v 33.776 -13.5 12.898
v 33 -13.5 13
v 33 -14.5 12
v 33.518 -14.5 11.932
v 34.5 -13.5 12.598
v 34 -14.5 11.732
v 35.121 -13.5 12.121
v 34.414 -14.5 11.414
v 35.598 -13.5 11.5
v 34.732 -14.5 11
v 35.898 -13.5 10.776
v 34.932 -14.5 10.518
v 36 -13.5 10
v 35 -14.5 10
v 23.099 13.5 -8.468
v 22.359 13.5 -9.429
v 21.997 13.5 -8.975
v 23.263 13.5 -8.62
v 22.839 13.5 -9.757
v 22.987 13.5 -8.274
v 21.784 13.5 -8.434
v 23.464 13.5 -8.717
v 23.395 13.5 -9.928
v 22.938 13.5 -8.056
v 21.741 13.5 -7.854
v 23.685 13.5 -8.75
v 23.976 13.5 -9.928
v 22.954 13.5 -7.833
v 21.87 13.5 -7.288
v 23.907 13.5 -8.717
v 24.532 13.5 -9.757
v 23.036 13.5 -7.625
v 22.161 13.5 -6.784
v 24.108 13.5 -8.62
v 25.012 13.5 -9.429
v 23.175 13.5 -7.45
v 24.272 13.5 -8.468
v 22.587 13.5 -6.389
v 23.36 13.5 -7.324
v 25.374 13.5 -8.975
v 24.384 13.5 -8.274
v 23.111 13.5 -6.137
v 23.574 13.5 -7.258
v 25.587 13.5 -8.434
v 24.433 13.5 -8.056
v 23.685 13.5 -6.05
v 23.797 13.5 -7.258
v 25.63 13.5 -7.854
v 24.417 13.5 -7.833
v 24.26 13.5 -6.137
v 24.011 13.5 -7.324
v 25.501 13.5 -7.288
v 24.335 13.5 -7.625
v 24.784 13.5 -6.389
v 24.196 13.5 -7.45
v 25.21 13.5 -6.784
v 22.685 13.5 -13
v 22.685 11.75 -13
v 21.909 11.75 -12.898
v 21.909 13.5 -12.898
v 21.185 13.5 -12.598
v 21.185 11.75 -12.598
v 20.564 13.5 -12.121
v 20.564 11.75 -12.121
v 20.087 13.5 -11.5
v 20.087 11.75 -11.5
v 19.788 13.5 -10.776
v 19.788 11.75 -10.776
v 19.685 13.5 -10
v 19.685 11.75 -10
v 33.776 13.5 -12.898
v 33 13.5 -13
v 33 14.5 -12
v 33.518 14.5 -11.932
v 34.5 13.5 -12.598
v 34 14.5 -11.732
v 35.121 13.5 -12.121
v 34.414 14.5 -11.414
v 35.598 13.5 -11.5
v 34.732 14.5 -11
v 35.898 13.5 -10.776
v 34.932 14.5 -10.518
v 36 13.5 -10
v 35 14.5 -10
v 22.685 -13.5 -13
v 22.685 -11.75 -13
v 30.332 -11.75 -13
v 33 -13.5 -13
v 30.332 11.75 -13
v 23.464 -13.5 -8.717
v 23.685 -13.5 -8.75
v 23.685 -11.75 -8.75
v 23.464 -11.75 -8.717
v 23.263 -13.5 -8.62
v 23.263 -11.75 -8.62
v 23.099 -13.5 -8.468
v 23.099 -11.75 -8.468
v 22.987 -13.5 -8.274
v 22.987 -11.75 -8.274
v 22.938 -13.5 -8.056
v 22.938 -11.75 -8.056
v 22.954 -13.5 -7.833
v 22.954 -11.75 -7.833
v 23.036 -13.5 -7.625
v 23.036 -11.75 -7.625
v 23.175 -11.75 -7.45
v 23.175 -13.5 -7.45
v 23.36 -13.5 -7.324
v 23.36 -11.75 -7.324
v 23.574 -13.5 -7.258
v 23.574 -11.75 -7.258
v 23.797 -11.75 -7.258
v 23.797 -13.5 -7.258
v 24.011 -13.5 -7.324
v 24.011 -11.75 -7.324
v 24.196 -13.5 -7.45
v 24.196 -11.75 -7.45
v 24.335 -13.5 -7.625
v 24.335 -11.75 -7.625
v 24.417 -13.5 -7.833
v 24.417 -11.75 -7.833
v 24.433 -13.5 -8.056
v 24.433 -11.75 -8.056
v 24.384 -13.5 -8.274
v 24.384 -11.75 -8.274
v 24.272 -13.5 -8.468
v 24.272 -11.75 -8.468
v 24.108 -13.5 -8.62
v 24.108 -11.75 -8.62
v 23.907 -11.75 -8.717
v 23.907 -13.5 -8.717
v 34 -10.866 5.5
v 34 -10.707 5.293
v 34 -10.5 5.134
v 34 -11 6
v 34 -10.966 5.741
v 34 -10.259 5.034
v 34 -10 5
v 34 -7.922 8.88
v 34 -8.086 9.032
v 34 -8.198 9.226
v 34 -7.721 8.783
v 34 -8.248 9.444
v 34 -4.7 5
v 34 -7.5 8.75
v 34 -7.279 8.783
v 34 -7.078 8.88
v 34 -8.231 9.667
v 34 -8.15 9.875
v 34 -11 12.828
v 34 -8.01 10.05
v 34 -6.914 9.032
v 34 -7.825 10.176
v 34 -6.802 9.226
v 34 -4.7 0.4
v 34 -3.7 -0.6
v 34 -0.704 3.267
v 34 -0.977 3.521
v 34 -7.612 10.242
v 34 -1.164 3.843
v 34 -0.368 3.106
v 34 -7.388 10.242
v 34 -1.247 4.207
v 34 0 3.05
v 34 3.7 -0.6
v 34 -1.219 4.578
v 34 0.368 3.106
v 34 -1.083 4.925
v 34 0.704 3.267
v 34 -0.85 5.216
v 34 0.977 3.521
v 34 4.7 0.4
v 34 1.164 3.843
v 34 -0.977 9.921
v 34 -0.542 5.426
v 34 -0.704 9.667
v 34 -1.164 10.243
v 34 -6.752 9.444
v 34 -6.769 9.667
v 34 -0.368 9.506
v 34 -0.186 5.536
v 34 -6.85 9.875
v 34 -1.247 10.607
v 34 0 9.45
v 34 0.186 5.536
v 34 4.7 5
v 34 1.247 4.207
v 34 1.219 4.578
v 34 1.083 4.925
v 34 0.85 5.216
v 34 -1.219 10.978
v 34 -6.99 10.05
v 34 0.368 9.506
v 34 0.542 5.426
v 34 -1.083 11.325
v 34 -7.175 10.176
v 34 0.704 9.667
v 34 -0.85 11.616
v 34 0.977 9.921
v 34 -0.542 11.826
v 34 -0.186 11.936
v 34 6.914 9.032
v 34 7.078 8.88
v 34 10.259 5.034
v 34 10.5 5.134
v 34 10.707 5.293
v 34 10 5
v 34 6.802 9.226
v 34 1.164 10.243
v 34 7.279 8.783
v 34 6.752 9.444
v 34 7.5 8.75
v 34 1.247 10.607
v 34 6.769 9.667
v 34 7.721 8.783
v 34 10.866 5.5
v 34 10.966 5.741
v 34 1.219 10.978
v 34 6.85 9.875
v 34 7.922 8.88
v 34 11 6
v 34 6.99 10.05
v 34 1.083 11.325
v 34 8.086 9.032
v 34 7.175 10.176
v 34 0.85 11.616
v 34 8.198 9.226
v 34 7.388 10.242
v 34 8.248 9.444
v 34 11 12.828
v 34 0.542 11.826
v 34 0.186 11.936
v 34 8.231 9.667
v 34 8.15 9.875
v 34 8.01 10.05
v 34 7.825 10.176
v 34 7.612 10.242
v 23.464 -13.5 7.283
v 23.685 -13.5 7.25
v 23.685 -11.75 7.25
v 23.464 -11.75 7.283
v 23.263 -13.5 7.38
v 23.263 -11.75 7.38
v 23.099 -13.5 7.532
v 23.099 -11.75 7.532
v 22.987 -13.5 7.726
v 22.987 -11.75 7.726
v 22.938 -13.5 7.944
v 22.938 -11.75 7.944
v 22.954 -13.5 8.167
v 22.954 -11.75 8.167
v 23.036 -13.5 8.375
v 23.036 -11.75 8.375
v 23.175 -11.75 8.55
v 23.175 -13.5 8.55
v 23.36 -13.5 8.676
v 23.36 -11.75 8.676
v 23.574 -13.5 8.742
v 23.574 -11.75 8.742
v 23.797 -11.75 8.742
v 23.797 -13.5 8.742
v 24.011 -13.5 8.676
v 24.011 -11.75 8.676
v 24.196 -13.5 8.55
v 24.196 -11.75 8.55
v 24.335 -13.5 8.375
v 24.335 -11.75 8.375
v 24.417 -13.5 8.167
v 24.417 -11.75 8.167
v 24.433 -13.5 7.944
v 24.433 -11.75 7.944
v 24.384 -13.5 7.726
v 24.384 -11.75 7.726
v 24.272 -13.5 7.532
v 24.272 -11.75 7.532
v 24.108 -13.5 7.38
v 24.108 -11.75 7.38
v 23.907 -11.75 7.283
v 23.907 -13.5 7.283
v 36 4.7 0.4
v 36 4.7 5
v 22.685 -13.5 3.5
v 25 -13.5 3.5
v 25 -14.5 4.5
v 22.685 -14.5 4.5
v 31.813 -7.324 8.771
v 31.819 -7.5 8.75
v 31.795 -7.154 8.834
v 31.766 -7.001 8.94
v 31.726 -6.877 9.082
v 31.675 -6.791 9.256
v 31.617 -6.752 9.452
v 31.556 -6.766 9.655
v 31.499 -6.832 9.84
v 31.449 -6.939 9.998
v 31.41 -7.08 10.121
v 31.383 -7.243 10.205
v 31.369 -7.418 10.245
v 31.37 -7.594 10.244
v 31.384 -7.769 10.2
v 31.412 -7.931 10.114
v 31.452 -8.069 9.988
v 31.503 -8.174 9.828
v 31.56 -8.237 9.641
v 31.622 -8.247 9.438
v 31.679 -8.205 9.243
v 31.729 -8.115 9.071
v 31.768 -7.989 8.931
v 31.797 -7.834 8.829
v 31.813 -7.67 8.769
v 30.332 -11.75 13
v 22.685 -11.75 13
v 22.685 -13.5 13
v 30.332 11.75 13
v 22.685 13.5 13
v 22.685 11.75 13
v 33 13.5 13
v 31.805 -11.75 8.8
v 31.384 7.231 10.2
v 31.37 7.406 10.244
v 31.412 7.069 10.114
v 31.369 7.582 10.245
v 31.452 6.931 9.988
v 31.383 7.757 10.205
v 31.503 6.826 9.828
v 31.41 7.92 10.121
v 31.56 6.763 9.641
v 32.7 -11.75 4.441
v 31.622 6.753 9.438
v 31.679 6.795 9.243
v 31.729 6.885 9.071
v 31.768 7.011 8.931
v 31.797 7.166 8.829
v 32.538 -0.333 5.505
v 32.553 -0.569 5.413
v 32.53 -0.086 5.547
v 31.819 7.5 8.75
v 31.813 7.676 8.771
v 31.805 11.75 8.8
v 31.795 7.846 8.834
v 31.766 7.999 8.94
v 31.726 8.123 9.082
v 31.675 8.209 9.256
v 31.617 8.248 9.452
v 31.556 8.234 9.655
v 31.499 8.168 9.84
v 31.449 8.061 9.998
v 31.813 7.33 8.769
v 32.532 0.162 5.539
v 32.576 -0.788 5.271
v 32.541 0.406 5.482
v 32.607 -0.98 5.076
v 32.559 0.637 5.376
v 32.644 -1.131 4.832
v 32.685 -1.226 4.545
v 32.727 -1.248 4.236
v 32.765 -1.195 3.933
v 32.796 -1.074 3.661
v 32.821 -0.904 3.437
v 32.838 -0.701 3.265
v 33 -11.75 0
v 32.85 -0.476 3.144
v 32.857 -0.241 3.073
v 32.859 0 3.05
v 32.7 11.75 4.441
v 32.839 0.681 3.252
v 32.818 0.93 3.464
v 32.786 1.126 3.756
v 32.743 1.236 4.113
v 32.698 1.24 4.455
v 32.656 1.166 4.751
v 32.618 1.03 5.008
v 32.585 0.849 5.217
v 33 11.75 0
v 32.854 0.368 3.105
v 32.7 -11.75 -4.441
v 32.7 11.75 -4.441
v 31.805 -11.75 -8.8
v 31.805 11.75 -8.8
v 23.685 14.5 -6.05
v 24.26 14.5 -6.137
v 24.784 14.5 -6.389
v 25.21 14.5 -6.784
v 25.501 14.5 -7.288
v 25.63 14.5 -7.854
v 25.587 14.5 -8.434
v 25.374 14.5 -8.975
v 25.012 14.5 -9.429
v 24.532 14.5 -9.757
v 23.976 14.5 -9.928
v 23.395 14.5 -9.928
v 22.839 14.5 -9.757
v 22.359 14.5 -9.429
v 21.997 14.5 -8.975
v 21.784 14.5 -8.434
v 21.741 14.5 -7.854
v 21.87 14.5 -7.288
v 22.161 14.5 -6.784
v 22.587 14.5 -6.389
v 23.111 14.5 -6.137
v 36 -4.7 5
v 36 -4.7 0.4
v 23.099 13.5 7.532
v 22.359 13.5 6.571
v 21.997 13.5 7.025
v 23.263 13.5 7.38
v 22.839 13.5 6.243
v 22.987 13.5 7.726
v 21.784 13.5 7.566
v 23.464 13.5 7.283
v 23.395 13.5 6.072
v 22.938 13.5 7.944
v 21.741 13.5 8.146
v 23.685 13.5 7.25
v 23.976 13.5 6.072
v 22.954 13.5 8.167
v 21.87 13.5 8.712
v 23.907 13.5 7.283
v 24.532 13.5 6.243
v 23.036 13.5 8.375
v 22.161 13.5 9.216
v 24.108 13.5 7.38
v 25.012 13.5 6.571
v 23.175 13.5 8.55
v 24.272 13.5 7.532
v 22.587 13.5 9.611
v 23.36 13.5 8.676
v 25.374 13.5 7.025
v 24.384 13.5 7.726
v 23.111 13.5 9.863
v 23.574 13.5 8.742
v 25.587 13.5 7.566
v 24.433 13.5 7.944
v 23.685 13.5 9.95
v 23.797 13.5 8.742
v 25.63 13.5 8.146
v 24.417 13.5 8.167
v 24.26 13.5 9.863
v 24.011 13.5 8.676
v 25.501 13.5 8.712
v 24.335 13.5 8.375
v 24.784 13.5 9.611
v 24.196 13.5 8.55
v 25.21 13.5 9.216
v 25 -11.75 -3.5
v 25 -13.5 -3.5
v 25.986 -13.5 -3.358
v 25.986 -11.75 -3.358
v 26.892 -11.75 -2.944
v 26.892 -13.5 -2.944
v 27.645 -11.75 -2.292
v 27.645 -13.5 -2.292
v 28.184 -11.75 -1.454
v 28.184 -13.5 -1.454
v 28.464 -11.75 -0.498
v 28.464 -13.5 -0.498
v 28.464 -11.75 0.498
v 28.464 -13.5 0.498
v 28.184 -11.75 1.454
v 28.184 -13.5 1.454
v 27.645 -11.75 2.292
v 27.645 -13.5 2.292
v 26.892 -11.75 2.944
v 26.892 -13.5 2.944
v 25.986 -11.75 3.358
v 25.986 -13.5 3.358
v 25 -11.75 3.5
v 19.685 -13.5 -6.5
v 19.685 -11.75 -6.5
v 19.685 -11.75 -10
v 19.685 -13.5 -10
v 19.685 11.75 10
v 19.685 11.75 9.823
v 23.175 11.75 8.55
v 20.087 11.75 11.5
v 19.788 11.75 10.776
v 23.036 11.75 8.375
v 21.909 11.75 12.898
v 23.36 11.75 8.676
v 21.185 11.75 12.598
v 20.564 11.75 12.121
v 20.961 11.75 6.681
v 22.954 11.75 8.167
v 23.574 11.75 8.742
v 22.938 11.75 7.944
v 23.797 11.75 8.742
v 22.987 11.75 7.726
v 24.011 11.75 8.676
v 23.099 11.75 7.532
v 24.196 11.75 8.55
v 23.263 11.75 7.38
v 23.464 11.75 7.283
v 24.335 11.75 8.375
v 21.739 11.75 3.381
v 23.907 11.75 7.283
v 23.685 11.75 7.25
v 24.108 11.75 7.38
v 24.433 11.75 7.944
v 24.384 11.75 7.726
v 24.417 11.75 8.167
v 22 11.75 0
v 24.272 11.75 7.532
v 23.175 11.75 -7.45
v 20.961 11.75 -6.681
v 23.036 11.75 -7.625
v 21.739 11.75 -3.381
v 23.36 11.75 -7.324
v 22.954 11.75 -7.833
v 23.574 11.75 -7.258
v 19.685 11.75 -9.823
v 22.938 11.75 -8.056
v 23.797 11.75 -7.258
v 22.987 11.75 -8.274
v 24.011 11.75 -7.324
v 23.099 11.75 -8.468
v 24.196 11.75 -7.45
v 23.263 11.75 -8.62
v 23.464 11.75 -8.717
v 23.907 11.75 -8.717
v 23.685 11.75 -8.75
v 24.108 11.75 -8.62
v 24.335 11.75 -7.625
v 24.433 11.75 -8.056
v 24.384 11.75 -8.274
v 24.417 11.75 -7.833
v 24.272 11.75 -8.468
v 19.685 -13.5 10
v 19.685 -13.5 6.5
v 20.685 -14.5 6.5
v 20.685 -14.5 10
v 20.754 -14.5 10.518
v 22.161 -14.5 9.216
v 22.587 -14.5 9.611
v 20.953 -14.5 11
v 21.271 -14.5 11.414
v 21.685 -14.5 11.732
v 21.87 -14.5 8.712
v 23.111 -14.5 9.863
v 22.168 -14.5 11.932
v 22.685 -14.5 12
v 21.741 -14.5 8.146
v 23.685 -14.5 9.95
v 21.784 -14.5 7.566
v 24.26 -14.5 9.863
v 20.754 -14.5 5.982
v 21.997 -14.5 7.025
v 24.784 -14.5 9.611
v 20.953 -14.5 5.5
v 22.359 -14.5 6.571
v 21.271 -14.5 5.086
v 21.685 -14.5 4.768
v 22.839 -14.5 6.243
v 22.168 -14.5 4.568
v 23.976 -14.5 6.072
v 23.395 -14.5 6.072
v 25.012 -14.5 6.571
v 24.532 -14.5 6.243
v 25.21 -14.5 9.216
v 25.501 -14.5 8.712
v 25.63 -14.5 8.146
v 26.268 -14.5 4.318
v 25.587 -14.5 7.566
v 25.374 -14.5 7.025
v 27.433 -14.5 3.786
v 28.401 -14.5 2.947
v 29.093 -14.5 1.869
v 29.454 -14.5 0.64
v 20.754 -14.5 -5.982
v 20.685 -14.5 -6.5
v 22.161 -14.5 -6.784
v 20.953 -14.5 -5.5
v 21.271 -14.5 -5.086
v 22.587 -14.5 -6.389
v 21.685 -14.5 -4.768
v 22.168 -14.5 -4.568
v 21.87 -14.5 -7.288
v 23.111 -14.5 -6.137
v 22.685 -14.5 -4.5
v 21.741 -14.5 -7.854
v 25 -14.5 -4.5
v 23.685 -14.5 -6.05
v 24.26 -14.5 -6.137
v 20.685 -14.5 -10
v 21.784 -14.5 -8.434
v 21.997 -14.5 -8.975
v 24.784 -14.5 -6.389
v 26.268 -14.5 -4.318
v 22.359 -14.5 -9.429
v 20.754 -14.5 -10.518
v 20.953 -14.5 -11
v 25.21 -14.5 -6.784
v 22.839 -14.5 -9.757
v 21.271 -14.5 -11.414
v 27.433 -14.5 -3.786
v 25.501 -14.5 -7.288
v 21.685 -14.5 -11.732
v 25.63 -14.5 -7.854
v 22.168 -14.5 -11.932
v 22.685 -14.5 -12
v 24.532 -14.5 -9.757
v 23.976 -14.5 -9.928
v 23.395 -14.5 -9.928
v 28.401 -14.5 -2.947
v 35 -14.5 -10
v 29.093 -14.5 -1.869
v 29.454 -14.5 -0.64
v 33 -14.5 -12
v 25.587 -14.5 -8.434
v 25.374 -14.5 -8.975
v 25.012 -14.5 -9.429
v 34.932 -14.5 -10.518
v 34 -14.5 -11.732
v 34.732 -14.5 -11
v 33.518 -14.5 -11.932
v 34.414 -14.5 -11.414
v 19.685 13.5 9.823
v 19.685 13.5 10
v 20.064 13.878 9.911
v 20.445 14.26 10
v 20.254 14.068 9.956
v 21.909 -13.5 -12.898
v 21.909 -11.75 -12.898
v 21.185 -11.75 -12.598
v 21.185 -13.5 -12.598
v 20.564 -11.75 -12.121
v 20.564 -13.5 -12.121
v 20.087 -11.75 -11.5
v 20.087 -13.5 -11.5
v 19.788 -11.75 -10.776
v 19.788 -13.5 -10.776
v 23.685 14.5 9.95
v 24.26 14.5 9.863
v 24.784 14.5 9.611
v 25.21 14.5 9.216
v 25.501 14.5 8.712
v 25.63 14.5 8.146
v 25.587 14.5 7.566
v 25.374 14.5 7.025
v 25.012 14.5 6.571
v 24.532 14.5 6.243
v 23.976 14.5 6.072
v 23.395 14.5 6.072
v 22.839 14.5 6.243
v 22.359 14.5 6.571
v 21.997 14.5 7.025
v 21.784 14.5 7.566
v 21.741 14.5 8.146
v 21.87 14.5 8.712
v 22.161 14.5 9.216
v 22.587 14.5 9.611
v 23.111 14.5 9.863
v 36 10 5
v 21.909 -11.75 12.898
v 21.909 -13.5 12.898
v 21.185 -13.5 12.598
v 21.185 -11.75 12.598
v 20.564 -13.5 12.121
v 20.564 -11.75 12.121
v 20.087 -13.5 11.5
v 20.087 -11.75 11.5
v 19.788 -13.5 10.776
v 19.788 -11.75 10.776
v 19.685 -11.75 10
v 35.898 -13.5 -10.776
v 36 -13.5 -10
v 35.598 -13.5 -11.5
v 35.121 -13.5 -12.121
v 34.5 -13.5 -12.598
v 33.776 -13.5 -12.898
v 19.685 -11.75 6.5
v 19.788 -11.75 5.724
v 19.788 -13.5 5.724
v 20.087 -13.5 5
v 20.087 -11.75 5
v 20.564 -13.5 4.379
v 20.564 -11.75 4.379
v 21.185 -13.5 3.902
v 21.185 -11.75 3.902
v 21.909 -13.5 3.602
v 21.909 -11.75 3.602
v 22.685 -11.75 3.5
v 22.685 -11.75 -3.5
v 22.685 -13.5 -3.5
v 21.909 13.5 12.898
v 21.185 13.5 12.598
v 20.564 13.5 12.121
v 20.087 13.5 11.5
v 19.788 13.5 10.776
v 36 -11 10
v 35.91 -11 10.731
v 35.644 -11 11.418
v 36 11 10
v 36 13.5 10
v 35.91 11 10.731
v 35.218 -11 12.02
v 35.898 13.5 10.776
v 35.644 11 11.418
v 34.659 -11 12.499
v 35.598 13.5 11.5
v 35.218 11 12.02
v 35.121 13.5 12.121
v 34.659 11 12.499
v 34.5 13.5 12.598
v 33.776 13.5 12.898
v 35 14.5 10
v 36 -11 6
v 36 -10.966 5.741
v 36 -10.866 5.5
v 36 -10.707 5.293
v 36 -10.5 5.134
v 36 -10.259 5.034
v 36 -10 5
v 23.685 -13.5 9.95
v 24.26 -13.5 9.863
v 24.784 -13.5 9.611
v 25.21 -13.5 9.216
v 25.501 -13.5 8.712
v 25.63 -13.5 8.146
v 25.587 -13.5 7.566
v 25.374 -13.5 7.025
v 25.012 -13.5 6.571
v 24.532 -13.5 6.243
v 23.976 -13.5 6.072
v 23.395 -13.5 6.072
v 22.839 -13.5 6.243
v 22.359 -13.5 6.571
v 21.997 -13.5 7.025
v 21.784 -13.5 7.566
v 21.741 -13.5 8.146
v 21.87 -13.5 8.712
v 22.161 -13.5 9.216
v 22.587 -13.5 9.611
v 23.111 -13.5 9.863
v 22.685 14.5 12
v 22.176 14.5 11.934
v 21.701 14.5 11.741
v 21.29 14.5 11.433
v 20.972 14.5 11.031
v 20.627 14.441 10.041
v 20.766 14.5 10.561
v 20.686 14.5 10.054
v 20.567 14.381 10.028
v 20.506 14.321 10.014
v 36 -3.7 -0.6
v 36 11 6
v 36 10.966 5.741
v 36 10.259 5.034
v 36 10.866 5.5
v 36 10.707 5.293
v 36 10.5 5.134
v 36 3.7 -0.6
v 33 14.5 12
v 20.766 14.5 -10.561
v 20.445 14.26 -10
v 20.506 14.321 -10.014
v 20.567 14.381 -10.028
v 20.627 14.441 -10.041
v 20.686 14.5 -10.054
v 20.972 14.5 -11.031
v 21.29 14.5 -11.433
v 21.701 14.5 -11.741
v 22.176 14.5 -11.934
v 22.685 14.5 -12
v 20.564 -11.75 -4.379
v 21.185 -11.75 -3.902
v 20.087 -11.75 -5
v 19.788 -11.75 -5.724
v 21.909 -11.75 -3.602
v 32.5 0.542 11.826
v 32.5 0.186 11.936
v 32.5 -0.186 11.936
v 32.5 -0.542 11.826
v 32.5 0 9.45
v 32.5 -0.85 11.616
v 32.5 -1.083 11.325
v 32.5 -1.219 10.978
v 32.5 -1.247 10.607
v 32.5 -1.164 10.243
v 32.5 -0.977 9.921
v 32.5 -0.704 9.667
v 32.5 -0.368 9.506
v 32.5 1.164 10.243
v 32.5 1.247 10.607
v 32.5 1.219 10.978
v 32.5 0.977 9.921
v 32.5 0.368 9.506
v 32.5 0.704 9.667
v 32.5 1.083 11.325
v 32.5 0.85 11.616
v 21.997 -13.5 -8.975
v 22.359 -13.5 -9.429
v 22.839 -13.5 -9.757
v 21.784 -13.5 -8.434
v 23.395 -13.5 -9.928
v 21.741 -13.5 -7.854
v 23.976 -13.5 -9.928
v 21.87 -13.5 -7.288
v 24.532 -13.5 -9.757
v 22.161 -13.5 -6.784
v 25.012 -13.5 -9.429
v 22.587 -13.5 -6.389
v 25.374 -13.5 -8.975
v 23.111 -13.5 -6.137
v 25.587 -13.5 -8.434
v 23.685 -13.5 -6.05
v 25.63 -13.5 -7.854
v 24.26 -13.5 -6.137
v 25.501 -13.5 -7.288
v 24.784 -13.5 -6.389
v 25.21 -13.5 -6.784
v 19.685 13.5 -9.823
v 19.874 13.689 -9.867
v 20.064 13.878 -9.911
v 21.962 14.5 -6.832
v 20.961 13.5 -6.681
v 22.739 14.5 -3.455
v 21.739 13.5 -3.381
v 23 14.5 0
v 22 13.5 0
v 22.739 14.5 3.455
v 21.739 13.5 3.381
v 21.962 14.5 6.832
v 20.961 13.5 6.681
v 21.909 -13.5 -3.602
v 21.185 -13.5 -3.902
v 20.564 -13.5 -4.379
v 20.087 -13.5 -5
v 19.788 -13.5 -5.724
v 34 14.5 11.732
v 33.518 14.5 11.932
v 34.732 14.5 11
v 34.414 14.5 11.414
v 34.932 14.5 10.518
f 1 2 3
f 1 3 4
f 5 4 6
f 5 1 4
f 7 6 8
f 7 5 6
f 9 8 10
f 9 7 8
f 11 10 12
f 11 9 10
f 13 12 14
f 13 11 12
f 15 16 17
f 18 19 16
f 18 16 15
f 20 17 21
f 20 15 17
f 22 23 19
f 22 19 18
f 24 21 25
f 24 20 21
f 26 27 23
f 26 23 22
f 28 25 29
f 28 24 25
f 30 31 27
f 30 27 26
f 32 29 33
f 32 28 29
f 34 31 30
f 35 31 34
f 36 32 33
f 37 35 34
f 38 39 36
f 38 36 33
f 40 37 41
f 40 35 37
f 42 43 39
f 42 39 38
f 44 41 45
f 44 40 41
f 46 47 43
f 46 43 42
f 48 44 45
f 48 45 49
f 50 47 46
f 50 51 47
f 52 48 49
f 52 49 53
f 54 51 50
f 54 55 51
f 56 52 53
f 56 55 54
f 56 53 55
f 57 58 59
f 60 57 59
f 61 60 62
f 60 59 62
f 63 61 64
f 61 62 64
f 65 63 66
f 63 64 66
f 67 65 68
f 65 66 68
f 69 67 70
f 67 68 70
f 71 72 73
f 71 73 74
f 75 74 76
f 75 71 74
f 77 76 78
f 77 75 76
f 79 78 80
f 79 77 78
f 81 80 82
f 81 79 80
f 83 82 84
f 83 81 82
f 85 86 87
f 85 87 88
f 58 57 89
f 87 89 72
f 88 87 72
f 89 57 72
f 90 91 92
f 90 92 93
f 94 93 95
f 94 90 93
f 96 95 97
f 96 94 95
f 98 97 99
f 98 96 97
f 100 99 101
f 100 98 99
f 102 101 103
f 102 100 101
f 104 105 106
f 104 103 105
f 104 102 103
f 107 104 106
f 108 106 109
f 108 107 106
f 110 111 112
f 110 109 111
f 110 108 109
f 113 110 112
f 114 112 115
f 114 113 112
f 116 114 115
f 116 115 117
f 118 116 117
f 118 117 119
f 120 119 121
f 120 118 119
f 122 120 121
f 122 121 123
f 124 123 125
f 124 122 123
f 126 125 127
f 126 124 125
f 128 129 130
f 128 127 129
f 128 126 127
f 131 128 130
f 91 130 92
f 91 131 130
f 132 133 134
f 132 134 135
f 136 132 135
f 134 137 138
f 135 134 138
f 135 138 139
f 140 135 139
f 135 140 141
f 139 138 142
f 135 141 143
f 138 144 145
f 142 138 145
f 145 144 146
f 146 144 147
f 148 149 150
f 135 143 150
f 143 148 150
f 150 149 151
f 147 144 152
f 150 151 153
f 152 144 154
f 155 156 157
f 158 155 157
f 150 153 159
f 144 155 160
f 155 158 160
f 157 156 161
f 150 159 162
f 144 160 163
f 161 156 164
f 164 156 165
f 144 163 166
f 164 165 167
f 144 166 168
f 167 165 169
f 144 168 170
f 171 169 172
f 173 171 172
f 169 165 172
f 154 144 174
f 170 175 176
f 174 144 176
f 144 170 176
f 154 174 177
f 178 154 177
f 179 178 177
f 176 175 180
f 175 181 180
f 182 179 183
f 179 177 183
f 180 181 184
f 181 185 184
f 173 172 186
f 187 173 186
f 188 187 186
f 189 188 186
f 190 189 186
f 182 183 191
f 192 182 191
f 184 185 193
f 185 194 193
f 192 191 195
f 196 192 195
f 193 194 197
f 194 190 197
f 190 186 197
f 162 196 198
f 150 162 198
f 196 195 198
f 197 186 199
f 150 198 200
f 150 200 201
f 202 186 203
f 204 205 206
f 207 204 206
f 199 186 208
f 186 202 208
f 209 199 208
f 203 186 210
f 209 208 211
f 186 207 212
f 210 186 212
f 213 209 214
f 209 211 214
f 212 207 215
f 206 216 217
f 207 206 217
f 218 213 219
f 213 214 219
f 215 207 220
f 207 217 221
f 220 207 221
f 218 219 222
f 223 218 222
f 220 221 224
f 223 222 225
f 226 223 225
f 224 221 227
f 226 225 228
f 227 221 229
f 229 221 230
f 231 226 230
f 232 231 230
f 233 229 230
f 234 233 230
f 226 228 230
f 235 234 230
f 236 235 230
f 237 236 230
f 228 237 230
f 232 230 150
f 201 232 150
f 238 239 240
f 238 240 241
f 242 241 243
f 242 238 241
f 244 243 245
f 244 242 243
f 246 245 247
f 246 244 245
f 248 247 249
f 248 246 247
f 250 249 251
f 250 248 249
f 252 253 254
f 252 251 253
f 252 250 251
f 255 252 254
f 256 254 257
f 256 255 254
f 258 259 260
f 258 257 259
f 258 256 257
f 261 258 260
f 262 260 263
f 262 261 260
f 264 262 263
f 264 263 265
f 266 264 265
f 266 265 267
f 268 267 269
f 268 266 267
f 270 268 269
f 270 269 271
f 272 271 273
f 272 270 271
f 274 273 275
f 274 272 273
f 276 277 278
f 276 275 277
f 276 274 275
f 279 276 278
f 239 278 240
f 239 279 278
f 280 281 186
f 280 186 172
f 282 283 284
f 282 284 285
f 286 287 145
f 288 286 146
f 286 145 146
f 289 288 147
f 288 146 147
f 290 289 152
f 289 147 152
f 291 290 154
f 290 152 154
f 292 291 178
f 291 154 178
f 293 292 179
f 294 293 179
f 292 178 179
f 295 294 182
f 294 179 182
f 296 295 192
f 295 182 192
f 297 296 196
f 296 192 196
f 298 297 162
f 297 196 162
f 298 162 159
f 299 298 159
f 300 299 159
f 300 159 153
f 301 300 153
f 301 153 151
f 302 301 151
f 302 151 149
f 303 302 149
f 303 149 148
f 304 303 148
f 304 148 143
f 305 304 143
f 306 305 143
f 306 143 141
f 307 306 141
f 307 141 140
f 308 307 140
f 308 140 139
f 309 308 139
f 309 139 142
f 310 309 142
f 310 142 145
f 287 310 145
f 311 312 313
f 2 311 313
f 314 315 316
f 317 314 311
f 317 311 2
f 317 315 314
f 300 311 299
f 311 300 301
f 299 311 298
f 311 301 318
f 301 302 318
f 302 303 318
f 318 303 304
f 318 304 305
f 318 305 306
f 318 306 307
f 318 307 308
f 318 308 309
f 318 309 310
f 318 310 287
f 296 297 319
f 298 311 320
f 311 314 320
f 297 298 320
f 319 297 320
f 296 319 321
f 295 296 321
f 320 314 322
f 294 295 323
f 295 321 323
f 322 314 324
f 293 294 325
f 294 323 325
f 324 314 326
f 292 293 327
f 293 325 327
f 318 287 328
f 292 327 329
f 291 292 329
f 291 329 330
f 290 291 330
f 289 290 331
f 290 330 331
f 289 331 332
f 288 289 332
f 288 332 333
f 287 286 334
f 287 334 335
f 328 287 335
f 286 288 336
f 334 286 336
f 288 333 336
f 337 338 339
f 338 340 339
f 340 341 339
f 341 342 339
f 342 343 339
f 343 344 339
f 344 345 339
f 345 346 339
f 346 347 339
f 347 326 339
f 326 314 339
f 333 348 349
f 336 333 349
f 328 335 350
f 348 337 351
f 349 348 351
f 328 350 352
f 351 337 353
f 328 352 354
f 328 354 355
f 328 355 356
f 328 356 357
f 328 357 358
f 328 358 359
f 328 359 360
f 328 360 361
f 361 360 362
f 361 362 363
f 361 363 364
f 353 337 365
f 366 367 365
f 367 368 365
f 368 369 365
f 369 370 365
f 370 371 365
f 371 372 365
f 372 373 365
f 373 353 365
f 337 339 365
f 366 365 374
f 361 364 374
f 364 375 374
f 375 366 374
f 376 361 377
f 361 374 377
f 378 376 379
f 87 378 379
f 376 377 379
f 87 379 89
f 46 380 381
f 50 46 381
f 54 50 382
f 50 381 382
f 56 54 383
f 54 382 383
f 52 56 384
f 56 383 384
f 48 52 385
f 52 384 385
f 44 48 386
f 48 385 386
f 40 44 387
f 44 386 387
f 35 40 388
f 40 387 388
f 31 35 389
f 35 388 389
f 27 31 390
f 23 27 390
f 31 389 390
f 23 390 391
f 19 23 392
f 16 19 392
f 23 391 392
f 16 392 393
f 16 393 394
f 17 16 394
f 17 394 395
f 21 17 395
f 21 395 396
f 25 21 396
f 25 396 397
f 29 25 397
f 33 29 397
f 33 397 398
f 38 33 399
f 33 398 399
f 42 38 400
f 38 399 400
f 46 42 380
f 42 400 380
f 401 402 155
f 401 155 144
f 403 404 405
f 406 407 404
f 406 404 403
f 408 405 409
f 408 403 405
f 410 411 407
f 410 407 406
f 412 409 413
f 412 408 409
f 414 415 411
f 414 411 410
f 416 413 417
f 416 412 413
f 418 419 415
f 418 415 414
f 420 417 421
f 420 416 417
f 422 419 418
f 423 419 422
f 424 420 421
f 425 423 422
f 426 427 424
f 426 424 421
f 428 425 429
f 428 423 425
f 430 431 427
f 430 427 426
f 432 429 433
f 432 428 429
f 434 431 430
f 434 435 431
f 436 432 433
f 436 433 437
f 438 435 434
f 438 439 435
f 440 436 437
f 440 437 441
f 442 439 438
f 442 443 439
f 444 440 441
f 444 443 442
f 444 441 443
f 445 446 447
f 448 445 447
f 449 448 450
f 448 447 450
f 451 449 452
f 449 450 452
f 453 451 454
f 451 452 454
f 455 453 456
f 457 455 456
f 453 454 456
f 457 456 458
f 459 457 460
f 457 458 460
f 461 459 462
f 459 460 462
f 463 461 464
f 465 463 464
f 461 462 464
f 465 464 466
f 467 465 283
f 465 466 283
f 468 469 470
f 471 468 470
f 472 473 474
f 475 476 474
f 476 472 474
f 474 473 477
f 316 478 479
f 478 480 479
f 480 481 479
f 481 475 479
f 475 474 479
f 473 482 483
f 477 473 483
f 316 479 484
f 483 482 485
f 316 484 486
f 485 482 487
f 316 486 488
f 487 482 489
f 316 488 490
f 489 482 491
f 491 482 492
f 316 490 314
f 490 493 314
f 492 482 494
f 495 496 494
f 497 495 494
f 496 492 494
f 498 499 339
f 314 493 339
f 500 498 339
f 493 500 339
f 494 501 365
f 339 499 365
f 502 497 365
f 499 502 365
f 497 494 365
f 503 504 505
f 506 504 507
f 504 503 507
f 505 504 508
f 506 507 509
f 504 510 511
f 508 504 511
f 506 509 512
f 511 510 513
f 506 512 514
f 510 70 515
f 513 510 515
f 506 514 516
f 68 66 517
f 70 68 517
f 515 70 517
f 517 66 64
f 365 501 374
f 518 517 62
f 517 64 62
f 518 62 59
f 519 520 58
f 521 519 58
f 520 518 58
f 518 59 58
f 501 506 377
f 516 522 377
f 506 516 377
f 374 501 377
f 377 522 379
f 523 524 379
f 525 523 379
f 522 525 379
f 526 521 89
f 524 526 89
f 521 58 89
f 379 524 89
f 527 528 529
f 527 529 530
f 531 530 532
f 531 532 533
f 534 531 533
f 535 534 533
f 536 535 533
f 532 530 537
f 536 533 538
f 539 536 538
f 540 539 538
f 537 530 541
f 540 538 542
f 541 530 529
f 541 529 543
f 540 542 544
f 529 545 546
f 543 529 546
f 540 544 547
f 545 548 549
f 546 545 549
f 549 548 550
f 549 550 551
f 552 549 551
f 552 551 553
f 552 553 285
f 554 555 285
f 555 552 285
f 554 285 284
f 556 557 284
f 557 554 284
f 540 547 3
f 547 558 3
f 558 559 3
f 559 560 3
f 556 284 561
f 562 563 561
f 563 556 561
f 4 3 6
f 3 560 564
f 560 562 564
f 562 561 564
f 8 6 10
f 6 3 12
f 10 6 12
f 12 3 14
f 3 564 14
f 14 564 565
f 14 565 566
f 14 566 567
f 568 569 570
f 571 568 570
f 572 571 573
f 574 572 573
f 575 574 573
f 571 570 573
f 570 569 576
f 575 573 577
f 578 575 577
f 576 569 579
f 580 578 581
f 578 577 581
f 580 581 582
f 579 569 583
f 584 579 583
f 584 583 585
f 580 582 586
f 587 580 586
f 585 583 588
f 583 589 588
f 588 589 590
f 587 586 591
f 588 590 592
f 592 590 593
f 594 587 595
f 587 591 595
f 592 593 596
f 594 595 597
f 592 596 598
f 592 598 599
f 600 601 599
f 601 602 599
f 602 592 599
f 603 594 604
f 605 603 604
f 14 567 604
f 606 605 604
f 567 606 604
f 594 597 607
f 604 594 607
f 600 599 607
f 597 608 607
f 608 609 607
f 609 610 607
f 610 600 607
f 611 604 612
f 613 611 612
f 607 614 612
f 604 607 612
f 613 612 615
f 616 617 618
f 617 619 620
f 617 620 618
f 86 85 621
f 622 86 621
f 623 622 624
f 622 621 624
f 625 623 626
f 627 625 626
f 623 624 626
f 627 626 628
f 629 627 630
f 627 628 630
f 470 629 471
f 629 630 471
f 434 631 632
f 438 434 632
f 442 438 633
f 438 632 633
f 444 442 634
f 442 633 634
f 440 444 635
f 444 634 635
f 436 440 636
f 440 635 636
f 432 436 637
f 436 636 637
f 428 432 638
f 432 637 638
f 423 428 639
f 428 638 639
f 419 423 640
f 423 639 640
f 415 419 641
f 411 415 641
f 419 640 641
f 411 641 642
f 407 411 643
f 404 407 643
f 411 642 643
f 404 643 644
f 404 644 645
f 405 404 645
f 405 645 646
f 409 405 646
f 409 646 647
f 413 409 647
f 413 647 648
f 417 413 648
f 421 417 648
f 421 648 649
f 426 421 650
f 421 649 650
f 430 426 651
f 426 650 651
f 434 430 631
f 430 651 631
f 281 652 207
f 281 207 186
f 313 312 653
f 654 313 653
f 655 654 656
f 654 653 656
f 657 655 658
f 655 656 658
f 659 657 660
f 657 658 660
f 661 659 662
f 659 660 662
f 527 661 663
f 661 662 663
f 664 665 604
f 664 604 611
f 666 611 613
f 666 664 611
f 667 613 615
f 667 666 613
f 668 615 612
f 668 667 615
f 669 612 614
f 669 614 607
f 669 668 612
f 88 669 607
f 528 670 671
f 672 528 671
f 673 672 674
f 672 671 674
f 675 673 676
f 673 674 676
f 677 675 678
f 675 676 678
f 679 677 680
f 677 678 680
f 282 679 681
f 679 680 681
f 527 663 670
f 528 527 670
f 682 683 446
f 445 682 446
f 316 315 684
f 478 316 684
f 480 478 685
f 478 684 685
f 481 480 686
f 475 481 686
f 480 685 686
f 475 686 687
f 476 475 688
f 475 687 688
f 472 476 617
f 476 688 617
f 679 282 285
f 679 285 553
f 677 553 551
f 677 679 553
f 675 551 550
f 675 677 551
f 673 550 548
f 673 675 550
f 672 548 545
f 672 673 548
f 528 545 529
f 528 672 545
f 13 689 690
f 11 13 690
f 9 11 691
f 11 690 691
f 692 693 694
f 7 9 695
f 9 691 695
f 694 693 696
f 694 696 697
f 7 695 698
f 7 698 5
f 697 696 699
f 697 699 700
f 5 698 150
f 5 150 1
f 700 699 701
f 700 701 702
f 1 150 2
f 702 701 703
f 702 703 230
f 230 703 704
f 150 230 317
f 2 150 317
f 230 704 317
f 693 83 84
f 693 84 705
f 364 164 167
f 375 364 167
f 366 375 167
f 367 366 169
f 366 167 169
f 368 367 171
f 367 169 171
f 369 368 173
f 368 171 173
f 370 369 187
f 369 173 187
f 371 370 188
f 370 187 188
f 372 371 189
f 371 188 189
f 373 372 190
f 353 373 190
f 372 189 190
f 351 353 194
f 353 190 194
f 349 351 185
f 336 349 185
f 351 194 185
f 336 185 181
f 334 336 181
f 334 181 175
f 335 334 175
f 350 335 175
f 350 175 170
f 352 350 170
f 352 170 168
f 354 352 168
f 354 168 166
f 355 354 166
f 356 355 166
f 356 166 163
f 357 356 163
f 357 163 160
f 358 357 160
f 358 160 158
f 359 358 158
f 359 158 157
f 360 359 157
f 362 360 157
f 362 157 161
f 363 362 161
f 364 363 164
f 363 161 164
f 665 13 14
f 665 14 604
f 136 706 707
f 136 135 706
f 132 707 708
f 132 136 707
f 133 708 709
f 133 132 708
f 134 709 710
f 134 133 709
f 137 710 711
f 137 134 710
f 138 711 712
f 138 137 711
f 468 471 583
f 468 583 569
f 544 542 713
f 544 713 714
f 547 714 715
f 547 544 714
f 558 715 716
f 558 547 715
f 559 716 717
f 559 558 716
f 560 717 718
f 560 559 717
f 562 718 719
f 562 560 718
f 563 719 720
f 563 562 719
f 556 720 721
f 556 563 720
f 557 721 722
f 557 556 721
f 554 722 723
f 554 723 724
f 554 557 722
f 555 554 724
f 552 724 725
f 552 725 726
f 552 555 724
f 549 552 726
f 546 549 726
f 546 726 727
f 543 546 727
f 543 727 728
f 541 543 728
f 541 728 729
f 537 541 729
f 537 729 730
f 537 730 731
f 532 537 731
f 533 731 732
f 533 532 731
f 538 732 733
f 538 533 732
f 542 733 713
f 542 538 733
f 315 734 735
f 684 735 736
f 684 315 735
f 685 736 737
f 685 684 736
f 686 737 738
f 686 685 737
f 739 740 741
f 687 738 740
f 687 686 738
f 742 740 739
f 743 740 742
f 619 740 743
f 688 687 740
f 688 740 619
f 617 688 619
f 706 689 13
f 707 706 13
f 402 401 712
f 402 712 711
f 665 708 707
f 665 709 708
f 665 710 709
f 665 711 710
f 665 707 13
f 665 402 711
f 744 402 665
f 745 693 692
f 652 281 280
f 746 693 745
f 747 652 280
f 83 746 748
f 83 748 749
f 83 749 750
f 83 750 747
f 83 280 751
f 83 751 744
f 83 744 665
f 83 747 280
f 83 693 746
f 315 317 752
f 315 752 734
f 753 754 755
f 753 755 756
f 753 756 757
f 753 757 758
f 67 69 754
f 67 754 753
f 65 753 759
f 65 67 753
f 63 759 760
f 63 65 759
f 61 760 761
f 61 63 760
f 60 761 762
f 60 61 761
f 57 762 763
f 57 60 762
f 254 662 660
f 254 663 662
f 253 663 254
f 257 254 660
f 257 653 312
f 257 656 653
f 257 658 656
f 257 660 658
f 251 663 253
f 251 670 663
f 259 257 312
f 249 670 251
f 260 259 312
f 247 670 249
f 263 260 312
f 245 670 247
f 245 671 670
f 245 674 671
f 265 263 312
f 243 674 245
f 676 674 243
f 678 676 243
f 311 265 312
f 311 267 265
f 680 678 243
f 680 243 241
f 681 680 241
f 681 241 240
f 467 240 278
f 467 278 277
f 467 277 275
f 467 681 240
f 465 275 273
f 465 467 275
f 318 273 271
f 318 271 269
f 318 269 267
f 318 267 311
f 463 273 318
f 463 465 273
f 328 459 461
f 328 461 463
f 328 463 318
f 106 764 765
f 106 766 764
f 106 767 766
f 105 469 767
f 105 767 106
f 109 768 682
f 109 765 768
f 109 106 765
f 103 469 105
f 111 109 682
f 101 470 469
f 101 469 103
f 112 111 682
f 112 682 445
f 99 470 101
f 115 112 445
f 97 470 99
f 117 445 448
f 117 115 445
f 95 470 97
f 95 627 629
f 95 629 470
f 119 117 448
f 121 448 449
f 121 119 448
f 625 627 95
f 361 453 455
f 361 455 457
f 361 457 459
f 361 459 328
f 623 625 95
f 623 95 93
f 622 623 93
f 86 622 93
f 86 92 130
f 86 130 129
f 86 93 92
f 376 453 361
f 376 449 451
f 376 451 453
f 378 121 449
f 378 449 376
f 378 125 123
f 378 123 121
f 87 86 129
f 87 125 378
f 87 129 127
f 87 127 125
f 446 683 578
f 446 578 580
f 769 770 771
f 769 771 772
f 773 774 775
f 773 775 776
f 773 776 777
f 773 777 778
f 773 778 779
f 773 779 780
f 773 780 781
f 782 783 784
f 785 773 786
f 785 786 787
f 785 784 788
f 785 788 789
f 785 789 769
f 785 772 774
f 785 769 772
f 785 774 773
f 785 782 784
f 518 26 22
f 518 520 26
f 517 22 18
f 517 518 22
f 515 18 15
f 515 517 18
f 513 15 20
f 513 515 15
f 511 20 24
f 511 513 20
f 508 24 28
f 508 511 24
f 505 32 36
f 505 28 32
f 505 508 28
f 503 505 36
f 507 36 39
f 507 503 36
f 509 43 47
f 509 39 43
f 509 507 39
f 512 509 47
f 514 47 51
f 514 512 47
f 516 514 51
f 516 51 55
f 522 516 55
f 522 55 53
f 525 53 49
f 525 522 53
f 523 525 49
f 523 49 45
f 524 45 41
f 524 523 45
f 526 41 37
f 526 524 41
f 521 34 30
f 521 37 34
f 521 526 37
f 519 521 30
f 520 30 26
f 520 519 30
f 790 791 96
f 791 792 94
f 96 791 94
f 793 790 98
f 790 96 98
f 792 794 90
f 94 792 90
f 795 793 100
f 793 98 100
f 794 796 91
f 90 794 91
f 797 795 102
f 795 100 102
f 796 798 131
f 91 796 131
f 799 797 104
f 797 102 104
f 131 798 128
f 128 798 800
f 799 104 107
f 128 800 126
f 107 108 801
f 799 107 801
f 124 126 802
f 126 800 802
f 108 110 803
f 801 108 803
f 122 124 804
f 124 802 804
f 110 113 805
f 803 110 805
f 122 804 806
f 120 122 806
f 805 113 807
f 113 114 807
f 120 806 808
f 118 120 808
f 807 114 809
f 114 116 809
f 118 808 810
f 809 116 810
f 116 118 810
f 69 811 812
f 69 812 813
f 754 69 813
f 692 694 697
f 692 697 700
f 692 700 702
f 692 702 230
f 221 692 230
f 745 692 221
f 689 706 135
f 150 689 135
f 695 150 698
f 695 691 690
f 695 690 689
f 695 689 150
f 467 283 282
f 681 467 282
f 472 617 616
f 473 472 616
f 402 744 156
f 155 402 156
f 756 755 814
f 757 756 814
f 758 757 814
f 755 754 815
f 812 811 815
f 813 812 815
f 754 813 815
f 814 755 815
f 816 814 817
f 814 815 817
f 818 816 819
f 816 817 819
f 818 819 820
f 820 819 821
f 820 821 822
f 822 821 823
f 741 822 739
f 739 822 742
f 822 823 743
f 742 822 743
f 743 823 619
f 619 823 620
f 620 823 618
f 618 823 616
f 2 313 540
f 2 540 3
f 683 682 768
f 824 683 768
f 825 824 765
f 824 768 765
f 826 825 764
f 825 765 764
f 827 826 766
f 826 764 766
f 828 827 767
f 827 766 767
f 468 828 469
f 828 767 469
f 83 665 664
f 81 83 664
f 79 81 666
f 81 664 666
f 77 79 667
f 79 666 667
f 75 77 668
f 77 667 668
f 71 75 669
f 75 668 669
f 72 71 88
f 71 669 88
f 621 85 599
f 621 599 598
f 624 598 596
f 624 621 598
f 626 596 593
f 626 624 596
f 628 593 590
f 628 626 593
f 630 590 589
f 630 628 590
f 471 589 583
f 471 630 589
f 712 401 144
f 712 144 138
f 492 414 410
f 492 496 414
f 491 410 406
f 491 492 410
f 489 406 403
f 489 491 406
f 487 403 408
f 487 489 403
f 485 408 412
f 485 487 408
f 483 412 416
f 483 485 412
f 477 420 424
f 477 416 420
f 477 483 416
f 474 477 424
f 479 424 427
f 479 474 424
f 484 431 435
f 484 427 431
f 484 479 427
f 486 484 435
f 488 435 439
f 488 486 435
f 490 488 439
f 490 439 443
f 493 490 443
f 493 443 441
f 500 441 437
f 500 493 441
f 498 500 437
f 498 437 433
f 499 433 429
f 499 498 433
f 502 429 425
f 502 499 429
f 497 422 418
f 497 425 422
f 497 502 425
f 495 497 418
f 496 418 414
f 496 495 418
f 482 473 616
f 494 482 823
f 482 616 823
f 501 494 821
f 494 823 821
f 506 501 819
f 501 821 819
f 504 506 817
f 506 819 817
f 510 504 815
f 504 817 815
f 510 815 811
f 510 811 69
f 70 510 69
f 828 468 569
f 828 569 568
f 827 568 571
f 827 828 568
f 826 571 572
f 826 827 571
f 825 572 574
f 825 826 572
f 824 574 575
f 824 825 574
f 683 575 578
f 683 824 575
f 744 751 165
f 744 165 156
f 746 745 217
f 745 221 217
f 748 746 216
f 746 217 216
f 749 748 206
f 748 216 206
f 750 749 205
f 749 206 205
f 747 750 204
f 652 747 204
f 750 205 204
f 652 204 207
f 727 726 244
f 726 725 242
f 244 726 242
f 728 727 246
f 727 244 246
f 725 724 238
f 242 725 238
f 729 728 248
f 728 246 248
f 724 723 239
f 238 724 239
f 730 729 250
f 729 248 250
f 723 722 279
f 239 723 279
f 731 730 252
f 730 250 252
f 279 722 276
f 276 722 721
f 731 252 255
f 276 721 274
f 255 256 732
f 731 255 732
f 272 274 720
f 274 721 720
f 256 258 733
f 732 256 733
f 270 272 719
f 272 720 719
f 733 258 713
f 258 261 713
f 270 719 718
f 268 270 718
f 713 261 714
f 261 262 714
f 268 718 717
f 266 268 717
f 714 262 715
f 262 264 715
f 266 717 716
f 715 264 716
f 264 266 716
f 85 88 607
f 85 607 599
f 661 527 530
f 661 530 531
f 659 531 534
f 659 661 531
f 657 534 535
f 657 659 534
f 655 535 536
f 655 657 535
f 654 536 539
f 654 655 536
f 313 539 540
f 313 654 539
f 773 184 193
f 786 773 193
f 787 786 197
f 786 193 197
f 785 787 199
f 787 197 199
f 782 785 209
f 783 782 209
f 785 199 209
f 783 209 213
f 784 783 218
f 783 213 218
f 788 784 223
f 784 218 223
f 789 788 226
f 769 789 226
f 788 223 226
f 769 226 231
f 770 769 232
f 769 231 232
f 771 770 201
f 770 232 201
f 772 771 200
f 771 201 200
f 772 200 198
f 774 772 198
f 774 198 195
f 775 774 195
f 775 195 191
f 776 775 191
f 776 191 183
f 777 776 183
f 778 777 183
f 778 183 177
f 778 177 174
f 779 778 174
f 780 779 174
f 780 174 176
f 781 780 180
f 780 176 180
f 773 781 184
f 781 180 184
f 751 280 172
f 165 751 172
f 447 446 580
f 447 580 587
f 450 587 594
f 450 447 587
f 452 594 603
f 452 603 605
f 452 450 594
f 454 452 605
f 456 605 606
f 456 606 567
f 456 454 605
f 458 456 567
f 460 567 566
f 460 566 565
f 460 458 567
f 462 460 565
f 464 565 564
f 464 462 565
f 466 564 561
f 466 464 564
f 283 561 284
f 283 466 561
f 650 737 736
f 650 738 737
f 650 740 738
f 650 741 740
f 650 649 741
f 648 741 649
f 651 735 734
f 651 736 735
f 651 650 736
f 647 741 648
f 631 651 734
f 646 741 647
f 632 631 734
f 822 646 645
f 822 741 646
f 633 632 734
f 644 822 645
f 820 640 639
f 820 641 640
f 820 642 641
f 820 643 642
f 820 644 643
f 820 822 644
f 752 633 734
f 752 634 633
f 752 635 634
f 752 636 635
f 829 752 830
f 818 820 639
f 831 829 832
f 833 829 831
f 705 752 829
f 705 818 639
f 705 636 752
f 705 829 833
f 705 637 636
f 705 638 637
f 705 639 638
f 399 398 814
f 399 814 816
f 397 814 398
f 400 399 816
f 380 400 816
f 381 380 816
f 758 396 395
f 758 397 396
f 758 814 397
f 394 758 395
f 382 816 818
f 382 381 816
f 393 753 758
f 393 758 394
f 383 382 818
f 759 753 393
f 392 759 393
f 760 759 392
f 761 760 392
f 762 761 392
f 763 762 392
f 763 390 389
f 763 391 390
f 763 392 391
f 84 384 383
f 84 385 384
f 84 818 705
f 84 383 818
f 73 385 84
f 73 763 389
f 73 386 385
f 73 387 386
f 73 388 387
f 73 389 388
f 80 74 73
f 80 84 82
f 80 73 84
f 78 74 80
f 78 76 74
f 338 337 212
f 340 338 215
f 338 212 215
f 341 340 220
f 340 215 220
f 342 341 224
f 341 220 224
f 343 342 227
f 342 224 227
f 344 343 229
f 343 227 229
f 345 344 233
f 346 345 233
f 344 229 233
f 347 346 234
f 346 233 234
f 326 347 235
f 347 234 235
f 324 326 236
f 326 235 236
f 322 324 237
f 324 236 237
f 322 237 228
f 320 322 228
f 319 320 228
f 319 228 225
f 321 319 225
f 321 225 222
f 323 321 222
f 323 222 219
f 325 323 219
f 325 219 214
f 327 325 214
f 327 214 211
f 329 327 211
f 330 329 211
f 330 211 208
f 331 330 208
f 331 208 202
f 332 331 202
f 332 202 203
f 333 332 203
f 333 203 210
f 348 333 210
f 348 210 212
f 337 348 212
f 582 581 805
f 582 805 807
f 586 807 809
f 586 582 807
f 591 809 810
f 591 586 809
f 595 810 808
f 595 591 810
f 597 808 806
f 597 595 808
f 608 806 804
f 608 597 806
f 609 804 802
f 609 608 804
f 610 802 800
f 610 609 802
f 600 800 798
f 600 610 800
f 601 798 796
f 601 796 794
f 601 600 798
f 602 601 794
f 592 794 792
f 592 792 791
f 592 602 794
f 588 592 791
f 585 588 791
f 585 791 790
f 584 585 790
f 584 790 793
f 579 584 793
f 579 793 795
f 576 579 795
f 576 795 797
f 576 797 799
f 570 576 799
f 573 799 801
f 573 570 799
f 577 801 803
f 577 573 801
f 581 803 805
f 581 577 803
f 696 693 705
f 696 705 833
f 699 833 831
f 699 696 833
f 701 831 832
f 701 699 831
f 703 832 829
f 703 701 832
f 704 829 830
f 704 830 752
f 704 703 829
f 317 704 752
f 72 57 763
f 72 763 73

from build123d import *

# Parameters (mm, degrees)
SKETCH_1_W          = 16.31456143534598
SKETCH_1_H          = 26.000000000000004
SKETCH_1_R          = 0.7500000000000021
EXTRUDE_1_DEPTH     = 14.5
SKETCH_2_R          = 33
CUT_EXTRUDE_1_DEPTH = 11.75
CUT_EXTRUDE_2_DEPTH = 2
CUT_EXTRUDE_7_REACH = 50.021
SKETCH_8_R          = 22
FILLET_1_R          = 1
CHAMFER_1_SIZE      = 1
SKETCH_4_R          = 1.2500000000000002
SKETCH_4_R_2        = 1.2499999999999991
CUT_EXTRUDE_3_DEPTH = 1.5
SKETCH_5_R          = 0.7500000000000004
CUT_EXTRUDE_4_DEPTH = 25.169333290066117
CUT_EXTRUDE_5_REACH = 50.021
FILLET_2_R          = 3
CHAMFER_3_SIZE      = 1
SKETCH_7_R          = 1.949999999999999
CUT_EXTRUDE_6_DEPTH = 1
CHAMFER_4_SIZE      = 1


with BuildPart() as part:
    # Эскиз1 → Бобышка-Вытянуть1 (new, symmetric)
    with BuildSketch(Plane(origin=(0, 0, 0), x_dir=(1, 0, 0), z_dir=(0, 1, 0))):
        with Locations((27.84271928232701, 0)):
            Rectangle(SKETCH_1_W, SKETCH_1_H)
        with Locations(Location((23.68543856465402, -8, 0), (0, 0, 90))):
            Circle(SKETCH_1_R, mode=Mode.SUBTRACT)
        with Locations(Location((23.68543856465402, 8, 0), (0, 0, 90))):
            Circle(SKETCH_1_R, mode=Mode.SUBTRACT)
    extrude(amount=EXTRUDE_1_DEPTH, both=True)

    # Эскиз2 → Вырез-Вытянуть1 (cut, symmetric)
    with BuildSketch(Plane(origin=(0, 0, 0), x_dir=(1, 0, 0), z_dir=(0, 1, 0))):
        Circle(SKETCH_2_R)
    extrude(amount=CUT_EXTRUDE_1_DEPTH, both=True, mode=Mode.SUBTRACT)

    # Эскиз3 → Вырез-Вытянуть2 (cut)
    with BuildSketch(Plane(origin=(36, 0, 0), x_dir=(0, 0, -1), z_dir=(1, 0, 0))):
        Polygon((-13.000000000000004, 10.999999999999998), (-5.000000000000003, 10.999999999999996), (-5.000000000000002, 4.699999999999998), (0.5999999999999969, 4.699999999999999), (0.5999999999999981, -4.699999999999999), (-5.000000000000001, -4.7), (-5, -10.999999999999996), (-13, -11.000000000000002), align=None)
    extrude(amount=-CUT_EXTRUDE_2_DEPTH, mode=Mode.SUBTRACT)

    # Эскиз8 → Вырез-Вытянуть7 (cut, up to next)
    with BuildSketch(Plane(origin=(0, 14.5, 0), x_dir=(1, 0, 0), z_dir=(0, 1, 0)), mode=Mode.PRIVATE) as cut_extrude_7_sk1:
        Circle(SKETCH_8_R)
    cut_extrude_7_tool1 = extrude(cut_extrude_7_sk1.sketch, amount=-CUT_EXTRUDE_7_REACH, mode=Mode.PRIVATE) & part.part
    add(cut_extrude_7_tool1.solids().sort_by_distance((0, 14.5, 0))[0], mode=Mode.SUBTRACT)

    # Скругление1
    fillet_1_edges = [part.edges().sort_by_distance(p)[0] for p in [
        (35, 10.999999999999996, 5.000000000000003),
        (35, -10.999999999999996, 5),
    ]]
    fillet(fillet_1_edges, radius=FILLET_1_R)

    # Фаска1
    chamfer_1_edges = [part.edges().sort_by_distance(p)[0] for p in [
        (35, 4.699999999999999, -0.5999999999999969),
        (35, -4.699999999999999, -0.5999999999999981),
    ]]
    chamfer(chamfer_1_edges, length=CHAMFER_1_SIZE)

    # Эскиз4 → Вырез-Вытянуть3 (cut)
    with BuildSketch(Plane(origin=(33.99999999999999, 0, 0), x_dir=(0, 0, -1), z_dir=(1, 0, 0))):
        with Locations((-4.300000000000002, 0)):
            Circle(SKETCH_4_R)
        with Locations((-10.700000000000001, 0)):
            Circle(SKETCH_4_R_2)
    extrude(amount=-CUT_EXTRUDE_3_DEPTH, mode=Mode.SUBTRACT)

    # Эскиз5 → Вырез-Вытянуть4 (cut, through all)
    with BuildSketch(Plane(origin=(33.99999999999999, 0, 0), x_dir=(0, 0, -1), z_dir=(1, 0, 0))):
        with Locations((-9.500000000000002, 7.5)):
            Circle(SKETCH_5_R)
        with Locations((-9.500000000000002, -7.5)):
            Circle(SKETCH_5_R)
    extrude(amount=-CUT_EXTRUDE_4_DEPTH, mode=Mode.SUBTRACT)

    # Эскиз6 → Вырез-Вытянуть5 (cut, up to next)
    with BuildSketch(Plane.XZ.offset(14.5), mode=Mode.PRIVATE) as cut_extrude_5_sk1:
        with BuildLine():
            ThreePointArc((25, -3.5), (21.5, 4.3e-16), (25, 3.5))
            Line((25, 3.5), (19.68543856465402, 3.499999999999999))
            Line((19.68543856465402, 3.499999999999999), (19.68543856465402, -3.500000000000001))
            Line((19.68543856465402, -3.500000000000001), (25, -3.5))
        make_face()
    cut_extrude_5_tool1 = extrude(cut_extrude_5_sk1.sketch, amount=-CUT_EXTRUDE_5_REACH, mode=Mode.PRIVATE) & part.part
    # Эскиз6 → Вырез-Вытянуть5 (cut, up to next)
    with BuildSketch(Plane.XZ.offset(14.5), mode=Mode.PRIVATE) as cut_extrude_5_sk2:
        with BuildLine():
            ThreePointArc((28.5, 0), (27.474873734152915, 2.474873734152916), (25, 3.5))
            Line((25, 3.5), (25, -3.5))
            ThreePointArc((25, -3.5), (27.474873734152915, -2.474873734152917), (28.5, -8.6e-16))
        make_face()
    cut_extrude_5_tool2 = extrude(cut_extrude_5_sk2.sketch, amount=-CUT_EXTRUDE_5_REACH, mode=Mode.PRIVATE) & part.part
    # Эскиз6 → Вырез-Вытянуть5 (cut, up to next)
    with BuildSketch(Plane.XZ.offset(14.5), mode=Mode.PRIVATE) as cut_extrude_5_sk3:
        with BuildLine():
            Line((25, -3.5), (25, 3.5))
            ThreePointArc((25, 3.5), (21.5, 4.3e-16), (25, -3.5))
        make_face()
    cut_extrude_5_tool3 = extrude(cut_extrude_5_sk3.sketch, amount=-CUT_EXTRUDE_5_REACH, mode=Mode.PRIVATE) & part.part
    # Эскиз6 → Вырез-Вытянуть5 (cut, up to next)
    with BuildSketch(Plane.XZ.offset(14.5), mode=Mode.PRIVATE) as cut_extrude_5_sk4:
        with BuildLine():
            ThreePointArc((28.5, 0), (27.474873734152915, 2.474873734152916), (25, 3.5))
            Line((25, 3.5), (25, -3.5))
            ThreePointArc((25, -3.5), (27.474873734152915, -2.474873734152917), (28.5, -8.6e-16))
        make_face()
    cut_extrude_5_tool4 = extrude(cut_extrude_5_sk4.sketch, amount=-CUT_EXTRUDE_5_REACH, mode=Mode.PRIVATE) & part.part
    # Эскиз6 → Вырез-Вытянуть5 (cut, up to next)
    with BuildSketch(Plane.XZ.offset(14.5), mode=Mode.PRIVATE) as cut_extrude_5_sk5:
        with BuildLine():
            Line((25, -3.5), (25, 3.5))
            ThreePointArc((25, 3.5), (21.5, 4.3e-16), (25, -3.5))
        make_face()
    cut_extrude_5_tool5 = extrude(cut_extrude_5_sk5.sketch, amount=-CUT_EXTRUDE_5_REACH, mode=Mode.PRIVATE) & part.part
    add(cut_extrude_5_tool1.solids().sort_by_distance((21.087199, -14.5, 0))[0], mode=Mode.SUBTRACT)
    add(cut_extrude_5_tool2.solids().sort_by_distance((26.485446, -14.5, 0))[0], mode=Mode.SUBTRACT)
    add(cut_extrude_5_tool3.solids().sort_by_distance((23.514554, -14.5, 0))[0], mode=Mode.SUBTRACT)
    add(cut_extrude_5_tool4.solids().sort_by_distance((26.485446, -14.5, 0))[0], mode=Mode.SUBTRACT)
    add(cut_extrude_5_tool5.solids().sort_by_distance((23.514554, -14.5, 0))[0], mode=Mode.SUBTRACT)

    # Скругление2
    fillet_2_edges = [part.edges().sort_by_distance(p)[0] for p in [
        (19.68543856465402, 13.125, -13),
        (19.68543856465402, 13.125, 13),
        (19.68543856465402, -13.125, -13),
        (19.68543856465402, -13.125, 13),
        (36, 0, -13),
        (36, 12.75, 13),
        (19.68543856465402, -13.125, 3.499999999999999),
        (19.68543856465402, -13.125, -3.500000000000001),
    ]]
    fillet(fillet_2_edges, radius=FILLET_2_R)

    # Фаска3
    chamfer_3_edges = [part.edges().sort_by_distance(p)[0] for p in [
        (23.84271928232701, -14.5, -3.5),
        (28.5, -14.5, -2.56e-15),
        (23.84271928232701, -14.5, 3.5),
        (19.68543856465402, -14.5, 8.25),
        (19.68543856465402, -14.5, -8.25),
        (27.84271928232701, -14.5, -13),
        (36, -14.5, 0),
        (27.84271928232701, -14.5, 13),
        (35.121320343559645, -14.5, 12.121320343559642),
        (35.121320343559645, -14.5, -12.121320343559642),
        (20.56411822109438, -14.5, 12.121320343559642),
        (20.56411822109438, -14.5, -12.121320343559642),
        (20.56411822109438, -14.5, -4.378679656440358),
        (20.56411822109438, -14.5, 4.378679656440358),
        (19.68543856465402, 14.5, -9.911300960978625),
        (27.84271928232701, 14.5, -13),
        (27.84271928232701, 14.5, 13),
        (36, 14.5, 0),
        (35.121320343559645, 14.5, 12.121320343559642),
        (35.121320343559645, 14.5, -12.121320343559642),
        (20.56411822109438, 14.5, 12.121320343559642),
        (20.56411822109438, 14.5, -12.121320343559642),
        (19.68543856465402, 14.5, 9.911300960978625),
    ]]
    chamfer(chamfer_3_edges, length=CHAMFER_3_SIZE)

    # Эскиз7 → Вырез-Вытянуть6 (cut)
    with BuildSketch(Plane(origin=(0, 14.5, 0), x_dir=(1, 0, 0), z_dir=(0, 1, 0))):
        with Locations(Location((23.68543856465402, 8, 0), (0, 0, 270))):
            Circle(SKETCH_7_R)
        with Locations(Location((23.68543856465402, -8, 0), (0, 0, 270))):
            Circle(SKETCH_7_R)
    cut_extrude_6 = extrude(amount=-CUT_EXTRUDE_6_DEPTH, mode=Mode.SUBTRACT)

    # Зеркальное отражение1: Вырез-Вытянуть6 across plane
    add(cut_extrude_6.mirror(Plane.ZX), mode=Mode.SUBTRACT)

    # Фаска4
    # the kernel refuses this chamfer: 1 mm, written as the material it takes off along each edge
    with BuildSketch(Plane(origin=(0, 14.5, 0), x_dir=(0.8941152756835695, 0, -0.44783688301578556), z_dir=(-0.44783688301578556, 0, -0.8941152756835695))) as chamfer_4_piece_1:
        Polygon((21.999999999999993 + CHAMFER_4_SIZE, 0), (21.999999999999996, CHAMFER_4_SIZE), (21.999999999999993, 0), align=None)
    revolve(axis=Axis((0, 14.5, 0), (0, -1, 0)), revolution_arc=53.209970164509144, mode=Mode.SUBTRACT)


solid = part.part
